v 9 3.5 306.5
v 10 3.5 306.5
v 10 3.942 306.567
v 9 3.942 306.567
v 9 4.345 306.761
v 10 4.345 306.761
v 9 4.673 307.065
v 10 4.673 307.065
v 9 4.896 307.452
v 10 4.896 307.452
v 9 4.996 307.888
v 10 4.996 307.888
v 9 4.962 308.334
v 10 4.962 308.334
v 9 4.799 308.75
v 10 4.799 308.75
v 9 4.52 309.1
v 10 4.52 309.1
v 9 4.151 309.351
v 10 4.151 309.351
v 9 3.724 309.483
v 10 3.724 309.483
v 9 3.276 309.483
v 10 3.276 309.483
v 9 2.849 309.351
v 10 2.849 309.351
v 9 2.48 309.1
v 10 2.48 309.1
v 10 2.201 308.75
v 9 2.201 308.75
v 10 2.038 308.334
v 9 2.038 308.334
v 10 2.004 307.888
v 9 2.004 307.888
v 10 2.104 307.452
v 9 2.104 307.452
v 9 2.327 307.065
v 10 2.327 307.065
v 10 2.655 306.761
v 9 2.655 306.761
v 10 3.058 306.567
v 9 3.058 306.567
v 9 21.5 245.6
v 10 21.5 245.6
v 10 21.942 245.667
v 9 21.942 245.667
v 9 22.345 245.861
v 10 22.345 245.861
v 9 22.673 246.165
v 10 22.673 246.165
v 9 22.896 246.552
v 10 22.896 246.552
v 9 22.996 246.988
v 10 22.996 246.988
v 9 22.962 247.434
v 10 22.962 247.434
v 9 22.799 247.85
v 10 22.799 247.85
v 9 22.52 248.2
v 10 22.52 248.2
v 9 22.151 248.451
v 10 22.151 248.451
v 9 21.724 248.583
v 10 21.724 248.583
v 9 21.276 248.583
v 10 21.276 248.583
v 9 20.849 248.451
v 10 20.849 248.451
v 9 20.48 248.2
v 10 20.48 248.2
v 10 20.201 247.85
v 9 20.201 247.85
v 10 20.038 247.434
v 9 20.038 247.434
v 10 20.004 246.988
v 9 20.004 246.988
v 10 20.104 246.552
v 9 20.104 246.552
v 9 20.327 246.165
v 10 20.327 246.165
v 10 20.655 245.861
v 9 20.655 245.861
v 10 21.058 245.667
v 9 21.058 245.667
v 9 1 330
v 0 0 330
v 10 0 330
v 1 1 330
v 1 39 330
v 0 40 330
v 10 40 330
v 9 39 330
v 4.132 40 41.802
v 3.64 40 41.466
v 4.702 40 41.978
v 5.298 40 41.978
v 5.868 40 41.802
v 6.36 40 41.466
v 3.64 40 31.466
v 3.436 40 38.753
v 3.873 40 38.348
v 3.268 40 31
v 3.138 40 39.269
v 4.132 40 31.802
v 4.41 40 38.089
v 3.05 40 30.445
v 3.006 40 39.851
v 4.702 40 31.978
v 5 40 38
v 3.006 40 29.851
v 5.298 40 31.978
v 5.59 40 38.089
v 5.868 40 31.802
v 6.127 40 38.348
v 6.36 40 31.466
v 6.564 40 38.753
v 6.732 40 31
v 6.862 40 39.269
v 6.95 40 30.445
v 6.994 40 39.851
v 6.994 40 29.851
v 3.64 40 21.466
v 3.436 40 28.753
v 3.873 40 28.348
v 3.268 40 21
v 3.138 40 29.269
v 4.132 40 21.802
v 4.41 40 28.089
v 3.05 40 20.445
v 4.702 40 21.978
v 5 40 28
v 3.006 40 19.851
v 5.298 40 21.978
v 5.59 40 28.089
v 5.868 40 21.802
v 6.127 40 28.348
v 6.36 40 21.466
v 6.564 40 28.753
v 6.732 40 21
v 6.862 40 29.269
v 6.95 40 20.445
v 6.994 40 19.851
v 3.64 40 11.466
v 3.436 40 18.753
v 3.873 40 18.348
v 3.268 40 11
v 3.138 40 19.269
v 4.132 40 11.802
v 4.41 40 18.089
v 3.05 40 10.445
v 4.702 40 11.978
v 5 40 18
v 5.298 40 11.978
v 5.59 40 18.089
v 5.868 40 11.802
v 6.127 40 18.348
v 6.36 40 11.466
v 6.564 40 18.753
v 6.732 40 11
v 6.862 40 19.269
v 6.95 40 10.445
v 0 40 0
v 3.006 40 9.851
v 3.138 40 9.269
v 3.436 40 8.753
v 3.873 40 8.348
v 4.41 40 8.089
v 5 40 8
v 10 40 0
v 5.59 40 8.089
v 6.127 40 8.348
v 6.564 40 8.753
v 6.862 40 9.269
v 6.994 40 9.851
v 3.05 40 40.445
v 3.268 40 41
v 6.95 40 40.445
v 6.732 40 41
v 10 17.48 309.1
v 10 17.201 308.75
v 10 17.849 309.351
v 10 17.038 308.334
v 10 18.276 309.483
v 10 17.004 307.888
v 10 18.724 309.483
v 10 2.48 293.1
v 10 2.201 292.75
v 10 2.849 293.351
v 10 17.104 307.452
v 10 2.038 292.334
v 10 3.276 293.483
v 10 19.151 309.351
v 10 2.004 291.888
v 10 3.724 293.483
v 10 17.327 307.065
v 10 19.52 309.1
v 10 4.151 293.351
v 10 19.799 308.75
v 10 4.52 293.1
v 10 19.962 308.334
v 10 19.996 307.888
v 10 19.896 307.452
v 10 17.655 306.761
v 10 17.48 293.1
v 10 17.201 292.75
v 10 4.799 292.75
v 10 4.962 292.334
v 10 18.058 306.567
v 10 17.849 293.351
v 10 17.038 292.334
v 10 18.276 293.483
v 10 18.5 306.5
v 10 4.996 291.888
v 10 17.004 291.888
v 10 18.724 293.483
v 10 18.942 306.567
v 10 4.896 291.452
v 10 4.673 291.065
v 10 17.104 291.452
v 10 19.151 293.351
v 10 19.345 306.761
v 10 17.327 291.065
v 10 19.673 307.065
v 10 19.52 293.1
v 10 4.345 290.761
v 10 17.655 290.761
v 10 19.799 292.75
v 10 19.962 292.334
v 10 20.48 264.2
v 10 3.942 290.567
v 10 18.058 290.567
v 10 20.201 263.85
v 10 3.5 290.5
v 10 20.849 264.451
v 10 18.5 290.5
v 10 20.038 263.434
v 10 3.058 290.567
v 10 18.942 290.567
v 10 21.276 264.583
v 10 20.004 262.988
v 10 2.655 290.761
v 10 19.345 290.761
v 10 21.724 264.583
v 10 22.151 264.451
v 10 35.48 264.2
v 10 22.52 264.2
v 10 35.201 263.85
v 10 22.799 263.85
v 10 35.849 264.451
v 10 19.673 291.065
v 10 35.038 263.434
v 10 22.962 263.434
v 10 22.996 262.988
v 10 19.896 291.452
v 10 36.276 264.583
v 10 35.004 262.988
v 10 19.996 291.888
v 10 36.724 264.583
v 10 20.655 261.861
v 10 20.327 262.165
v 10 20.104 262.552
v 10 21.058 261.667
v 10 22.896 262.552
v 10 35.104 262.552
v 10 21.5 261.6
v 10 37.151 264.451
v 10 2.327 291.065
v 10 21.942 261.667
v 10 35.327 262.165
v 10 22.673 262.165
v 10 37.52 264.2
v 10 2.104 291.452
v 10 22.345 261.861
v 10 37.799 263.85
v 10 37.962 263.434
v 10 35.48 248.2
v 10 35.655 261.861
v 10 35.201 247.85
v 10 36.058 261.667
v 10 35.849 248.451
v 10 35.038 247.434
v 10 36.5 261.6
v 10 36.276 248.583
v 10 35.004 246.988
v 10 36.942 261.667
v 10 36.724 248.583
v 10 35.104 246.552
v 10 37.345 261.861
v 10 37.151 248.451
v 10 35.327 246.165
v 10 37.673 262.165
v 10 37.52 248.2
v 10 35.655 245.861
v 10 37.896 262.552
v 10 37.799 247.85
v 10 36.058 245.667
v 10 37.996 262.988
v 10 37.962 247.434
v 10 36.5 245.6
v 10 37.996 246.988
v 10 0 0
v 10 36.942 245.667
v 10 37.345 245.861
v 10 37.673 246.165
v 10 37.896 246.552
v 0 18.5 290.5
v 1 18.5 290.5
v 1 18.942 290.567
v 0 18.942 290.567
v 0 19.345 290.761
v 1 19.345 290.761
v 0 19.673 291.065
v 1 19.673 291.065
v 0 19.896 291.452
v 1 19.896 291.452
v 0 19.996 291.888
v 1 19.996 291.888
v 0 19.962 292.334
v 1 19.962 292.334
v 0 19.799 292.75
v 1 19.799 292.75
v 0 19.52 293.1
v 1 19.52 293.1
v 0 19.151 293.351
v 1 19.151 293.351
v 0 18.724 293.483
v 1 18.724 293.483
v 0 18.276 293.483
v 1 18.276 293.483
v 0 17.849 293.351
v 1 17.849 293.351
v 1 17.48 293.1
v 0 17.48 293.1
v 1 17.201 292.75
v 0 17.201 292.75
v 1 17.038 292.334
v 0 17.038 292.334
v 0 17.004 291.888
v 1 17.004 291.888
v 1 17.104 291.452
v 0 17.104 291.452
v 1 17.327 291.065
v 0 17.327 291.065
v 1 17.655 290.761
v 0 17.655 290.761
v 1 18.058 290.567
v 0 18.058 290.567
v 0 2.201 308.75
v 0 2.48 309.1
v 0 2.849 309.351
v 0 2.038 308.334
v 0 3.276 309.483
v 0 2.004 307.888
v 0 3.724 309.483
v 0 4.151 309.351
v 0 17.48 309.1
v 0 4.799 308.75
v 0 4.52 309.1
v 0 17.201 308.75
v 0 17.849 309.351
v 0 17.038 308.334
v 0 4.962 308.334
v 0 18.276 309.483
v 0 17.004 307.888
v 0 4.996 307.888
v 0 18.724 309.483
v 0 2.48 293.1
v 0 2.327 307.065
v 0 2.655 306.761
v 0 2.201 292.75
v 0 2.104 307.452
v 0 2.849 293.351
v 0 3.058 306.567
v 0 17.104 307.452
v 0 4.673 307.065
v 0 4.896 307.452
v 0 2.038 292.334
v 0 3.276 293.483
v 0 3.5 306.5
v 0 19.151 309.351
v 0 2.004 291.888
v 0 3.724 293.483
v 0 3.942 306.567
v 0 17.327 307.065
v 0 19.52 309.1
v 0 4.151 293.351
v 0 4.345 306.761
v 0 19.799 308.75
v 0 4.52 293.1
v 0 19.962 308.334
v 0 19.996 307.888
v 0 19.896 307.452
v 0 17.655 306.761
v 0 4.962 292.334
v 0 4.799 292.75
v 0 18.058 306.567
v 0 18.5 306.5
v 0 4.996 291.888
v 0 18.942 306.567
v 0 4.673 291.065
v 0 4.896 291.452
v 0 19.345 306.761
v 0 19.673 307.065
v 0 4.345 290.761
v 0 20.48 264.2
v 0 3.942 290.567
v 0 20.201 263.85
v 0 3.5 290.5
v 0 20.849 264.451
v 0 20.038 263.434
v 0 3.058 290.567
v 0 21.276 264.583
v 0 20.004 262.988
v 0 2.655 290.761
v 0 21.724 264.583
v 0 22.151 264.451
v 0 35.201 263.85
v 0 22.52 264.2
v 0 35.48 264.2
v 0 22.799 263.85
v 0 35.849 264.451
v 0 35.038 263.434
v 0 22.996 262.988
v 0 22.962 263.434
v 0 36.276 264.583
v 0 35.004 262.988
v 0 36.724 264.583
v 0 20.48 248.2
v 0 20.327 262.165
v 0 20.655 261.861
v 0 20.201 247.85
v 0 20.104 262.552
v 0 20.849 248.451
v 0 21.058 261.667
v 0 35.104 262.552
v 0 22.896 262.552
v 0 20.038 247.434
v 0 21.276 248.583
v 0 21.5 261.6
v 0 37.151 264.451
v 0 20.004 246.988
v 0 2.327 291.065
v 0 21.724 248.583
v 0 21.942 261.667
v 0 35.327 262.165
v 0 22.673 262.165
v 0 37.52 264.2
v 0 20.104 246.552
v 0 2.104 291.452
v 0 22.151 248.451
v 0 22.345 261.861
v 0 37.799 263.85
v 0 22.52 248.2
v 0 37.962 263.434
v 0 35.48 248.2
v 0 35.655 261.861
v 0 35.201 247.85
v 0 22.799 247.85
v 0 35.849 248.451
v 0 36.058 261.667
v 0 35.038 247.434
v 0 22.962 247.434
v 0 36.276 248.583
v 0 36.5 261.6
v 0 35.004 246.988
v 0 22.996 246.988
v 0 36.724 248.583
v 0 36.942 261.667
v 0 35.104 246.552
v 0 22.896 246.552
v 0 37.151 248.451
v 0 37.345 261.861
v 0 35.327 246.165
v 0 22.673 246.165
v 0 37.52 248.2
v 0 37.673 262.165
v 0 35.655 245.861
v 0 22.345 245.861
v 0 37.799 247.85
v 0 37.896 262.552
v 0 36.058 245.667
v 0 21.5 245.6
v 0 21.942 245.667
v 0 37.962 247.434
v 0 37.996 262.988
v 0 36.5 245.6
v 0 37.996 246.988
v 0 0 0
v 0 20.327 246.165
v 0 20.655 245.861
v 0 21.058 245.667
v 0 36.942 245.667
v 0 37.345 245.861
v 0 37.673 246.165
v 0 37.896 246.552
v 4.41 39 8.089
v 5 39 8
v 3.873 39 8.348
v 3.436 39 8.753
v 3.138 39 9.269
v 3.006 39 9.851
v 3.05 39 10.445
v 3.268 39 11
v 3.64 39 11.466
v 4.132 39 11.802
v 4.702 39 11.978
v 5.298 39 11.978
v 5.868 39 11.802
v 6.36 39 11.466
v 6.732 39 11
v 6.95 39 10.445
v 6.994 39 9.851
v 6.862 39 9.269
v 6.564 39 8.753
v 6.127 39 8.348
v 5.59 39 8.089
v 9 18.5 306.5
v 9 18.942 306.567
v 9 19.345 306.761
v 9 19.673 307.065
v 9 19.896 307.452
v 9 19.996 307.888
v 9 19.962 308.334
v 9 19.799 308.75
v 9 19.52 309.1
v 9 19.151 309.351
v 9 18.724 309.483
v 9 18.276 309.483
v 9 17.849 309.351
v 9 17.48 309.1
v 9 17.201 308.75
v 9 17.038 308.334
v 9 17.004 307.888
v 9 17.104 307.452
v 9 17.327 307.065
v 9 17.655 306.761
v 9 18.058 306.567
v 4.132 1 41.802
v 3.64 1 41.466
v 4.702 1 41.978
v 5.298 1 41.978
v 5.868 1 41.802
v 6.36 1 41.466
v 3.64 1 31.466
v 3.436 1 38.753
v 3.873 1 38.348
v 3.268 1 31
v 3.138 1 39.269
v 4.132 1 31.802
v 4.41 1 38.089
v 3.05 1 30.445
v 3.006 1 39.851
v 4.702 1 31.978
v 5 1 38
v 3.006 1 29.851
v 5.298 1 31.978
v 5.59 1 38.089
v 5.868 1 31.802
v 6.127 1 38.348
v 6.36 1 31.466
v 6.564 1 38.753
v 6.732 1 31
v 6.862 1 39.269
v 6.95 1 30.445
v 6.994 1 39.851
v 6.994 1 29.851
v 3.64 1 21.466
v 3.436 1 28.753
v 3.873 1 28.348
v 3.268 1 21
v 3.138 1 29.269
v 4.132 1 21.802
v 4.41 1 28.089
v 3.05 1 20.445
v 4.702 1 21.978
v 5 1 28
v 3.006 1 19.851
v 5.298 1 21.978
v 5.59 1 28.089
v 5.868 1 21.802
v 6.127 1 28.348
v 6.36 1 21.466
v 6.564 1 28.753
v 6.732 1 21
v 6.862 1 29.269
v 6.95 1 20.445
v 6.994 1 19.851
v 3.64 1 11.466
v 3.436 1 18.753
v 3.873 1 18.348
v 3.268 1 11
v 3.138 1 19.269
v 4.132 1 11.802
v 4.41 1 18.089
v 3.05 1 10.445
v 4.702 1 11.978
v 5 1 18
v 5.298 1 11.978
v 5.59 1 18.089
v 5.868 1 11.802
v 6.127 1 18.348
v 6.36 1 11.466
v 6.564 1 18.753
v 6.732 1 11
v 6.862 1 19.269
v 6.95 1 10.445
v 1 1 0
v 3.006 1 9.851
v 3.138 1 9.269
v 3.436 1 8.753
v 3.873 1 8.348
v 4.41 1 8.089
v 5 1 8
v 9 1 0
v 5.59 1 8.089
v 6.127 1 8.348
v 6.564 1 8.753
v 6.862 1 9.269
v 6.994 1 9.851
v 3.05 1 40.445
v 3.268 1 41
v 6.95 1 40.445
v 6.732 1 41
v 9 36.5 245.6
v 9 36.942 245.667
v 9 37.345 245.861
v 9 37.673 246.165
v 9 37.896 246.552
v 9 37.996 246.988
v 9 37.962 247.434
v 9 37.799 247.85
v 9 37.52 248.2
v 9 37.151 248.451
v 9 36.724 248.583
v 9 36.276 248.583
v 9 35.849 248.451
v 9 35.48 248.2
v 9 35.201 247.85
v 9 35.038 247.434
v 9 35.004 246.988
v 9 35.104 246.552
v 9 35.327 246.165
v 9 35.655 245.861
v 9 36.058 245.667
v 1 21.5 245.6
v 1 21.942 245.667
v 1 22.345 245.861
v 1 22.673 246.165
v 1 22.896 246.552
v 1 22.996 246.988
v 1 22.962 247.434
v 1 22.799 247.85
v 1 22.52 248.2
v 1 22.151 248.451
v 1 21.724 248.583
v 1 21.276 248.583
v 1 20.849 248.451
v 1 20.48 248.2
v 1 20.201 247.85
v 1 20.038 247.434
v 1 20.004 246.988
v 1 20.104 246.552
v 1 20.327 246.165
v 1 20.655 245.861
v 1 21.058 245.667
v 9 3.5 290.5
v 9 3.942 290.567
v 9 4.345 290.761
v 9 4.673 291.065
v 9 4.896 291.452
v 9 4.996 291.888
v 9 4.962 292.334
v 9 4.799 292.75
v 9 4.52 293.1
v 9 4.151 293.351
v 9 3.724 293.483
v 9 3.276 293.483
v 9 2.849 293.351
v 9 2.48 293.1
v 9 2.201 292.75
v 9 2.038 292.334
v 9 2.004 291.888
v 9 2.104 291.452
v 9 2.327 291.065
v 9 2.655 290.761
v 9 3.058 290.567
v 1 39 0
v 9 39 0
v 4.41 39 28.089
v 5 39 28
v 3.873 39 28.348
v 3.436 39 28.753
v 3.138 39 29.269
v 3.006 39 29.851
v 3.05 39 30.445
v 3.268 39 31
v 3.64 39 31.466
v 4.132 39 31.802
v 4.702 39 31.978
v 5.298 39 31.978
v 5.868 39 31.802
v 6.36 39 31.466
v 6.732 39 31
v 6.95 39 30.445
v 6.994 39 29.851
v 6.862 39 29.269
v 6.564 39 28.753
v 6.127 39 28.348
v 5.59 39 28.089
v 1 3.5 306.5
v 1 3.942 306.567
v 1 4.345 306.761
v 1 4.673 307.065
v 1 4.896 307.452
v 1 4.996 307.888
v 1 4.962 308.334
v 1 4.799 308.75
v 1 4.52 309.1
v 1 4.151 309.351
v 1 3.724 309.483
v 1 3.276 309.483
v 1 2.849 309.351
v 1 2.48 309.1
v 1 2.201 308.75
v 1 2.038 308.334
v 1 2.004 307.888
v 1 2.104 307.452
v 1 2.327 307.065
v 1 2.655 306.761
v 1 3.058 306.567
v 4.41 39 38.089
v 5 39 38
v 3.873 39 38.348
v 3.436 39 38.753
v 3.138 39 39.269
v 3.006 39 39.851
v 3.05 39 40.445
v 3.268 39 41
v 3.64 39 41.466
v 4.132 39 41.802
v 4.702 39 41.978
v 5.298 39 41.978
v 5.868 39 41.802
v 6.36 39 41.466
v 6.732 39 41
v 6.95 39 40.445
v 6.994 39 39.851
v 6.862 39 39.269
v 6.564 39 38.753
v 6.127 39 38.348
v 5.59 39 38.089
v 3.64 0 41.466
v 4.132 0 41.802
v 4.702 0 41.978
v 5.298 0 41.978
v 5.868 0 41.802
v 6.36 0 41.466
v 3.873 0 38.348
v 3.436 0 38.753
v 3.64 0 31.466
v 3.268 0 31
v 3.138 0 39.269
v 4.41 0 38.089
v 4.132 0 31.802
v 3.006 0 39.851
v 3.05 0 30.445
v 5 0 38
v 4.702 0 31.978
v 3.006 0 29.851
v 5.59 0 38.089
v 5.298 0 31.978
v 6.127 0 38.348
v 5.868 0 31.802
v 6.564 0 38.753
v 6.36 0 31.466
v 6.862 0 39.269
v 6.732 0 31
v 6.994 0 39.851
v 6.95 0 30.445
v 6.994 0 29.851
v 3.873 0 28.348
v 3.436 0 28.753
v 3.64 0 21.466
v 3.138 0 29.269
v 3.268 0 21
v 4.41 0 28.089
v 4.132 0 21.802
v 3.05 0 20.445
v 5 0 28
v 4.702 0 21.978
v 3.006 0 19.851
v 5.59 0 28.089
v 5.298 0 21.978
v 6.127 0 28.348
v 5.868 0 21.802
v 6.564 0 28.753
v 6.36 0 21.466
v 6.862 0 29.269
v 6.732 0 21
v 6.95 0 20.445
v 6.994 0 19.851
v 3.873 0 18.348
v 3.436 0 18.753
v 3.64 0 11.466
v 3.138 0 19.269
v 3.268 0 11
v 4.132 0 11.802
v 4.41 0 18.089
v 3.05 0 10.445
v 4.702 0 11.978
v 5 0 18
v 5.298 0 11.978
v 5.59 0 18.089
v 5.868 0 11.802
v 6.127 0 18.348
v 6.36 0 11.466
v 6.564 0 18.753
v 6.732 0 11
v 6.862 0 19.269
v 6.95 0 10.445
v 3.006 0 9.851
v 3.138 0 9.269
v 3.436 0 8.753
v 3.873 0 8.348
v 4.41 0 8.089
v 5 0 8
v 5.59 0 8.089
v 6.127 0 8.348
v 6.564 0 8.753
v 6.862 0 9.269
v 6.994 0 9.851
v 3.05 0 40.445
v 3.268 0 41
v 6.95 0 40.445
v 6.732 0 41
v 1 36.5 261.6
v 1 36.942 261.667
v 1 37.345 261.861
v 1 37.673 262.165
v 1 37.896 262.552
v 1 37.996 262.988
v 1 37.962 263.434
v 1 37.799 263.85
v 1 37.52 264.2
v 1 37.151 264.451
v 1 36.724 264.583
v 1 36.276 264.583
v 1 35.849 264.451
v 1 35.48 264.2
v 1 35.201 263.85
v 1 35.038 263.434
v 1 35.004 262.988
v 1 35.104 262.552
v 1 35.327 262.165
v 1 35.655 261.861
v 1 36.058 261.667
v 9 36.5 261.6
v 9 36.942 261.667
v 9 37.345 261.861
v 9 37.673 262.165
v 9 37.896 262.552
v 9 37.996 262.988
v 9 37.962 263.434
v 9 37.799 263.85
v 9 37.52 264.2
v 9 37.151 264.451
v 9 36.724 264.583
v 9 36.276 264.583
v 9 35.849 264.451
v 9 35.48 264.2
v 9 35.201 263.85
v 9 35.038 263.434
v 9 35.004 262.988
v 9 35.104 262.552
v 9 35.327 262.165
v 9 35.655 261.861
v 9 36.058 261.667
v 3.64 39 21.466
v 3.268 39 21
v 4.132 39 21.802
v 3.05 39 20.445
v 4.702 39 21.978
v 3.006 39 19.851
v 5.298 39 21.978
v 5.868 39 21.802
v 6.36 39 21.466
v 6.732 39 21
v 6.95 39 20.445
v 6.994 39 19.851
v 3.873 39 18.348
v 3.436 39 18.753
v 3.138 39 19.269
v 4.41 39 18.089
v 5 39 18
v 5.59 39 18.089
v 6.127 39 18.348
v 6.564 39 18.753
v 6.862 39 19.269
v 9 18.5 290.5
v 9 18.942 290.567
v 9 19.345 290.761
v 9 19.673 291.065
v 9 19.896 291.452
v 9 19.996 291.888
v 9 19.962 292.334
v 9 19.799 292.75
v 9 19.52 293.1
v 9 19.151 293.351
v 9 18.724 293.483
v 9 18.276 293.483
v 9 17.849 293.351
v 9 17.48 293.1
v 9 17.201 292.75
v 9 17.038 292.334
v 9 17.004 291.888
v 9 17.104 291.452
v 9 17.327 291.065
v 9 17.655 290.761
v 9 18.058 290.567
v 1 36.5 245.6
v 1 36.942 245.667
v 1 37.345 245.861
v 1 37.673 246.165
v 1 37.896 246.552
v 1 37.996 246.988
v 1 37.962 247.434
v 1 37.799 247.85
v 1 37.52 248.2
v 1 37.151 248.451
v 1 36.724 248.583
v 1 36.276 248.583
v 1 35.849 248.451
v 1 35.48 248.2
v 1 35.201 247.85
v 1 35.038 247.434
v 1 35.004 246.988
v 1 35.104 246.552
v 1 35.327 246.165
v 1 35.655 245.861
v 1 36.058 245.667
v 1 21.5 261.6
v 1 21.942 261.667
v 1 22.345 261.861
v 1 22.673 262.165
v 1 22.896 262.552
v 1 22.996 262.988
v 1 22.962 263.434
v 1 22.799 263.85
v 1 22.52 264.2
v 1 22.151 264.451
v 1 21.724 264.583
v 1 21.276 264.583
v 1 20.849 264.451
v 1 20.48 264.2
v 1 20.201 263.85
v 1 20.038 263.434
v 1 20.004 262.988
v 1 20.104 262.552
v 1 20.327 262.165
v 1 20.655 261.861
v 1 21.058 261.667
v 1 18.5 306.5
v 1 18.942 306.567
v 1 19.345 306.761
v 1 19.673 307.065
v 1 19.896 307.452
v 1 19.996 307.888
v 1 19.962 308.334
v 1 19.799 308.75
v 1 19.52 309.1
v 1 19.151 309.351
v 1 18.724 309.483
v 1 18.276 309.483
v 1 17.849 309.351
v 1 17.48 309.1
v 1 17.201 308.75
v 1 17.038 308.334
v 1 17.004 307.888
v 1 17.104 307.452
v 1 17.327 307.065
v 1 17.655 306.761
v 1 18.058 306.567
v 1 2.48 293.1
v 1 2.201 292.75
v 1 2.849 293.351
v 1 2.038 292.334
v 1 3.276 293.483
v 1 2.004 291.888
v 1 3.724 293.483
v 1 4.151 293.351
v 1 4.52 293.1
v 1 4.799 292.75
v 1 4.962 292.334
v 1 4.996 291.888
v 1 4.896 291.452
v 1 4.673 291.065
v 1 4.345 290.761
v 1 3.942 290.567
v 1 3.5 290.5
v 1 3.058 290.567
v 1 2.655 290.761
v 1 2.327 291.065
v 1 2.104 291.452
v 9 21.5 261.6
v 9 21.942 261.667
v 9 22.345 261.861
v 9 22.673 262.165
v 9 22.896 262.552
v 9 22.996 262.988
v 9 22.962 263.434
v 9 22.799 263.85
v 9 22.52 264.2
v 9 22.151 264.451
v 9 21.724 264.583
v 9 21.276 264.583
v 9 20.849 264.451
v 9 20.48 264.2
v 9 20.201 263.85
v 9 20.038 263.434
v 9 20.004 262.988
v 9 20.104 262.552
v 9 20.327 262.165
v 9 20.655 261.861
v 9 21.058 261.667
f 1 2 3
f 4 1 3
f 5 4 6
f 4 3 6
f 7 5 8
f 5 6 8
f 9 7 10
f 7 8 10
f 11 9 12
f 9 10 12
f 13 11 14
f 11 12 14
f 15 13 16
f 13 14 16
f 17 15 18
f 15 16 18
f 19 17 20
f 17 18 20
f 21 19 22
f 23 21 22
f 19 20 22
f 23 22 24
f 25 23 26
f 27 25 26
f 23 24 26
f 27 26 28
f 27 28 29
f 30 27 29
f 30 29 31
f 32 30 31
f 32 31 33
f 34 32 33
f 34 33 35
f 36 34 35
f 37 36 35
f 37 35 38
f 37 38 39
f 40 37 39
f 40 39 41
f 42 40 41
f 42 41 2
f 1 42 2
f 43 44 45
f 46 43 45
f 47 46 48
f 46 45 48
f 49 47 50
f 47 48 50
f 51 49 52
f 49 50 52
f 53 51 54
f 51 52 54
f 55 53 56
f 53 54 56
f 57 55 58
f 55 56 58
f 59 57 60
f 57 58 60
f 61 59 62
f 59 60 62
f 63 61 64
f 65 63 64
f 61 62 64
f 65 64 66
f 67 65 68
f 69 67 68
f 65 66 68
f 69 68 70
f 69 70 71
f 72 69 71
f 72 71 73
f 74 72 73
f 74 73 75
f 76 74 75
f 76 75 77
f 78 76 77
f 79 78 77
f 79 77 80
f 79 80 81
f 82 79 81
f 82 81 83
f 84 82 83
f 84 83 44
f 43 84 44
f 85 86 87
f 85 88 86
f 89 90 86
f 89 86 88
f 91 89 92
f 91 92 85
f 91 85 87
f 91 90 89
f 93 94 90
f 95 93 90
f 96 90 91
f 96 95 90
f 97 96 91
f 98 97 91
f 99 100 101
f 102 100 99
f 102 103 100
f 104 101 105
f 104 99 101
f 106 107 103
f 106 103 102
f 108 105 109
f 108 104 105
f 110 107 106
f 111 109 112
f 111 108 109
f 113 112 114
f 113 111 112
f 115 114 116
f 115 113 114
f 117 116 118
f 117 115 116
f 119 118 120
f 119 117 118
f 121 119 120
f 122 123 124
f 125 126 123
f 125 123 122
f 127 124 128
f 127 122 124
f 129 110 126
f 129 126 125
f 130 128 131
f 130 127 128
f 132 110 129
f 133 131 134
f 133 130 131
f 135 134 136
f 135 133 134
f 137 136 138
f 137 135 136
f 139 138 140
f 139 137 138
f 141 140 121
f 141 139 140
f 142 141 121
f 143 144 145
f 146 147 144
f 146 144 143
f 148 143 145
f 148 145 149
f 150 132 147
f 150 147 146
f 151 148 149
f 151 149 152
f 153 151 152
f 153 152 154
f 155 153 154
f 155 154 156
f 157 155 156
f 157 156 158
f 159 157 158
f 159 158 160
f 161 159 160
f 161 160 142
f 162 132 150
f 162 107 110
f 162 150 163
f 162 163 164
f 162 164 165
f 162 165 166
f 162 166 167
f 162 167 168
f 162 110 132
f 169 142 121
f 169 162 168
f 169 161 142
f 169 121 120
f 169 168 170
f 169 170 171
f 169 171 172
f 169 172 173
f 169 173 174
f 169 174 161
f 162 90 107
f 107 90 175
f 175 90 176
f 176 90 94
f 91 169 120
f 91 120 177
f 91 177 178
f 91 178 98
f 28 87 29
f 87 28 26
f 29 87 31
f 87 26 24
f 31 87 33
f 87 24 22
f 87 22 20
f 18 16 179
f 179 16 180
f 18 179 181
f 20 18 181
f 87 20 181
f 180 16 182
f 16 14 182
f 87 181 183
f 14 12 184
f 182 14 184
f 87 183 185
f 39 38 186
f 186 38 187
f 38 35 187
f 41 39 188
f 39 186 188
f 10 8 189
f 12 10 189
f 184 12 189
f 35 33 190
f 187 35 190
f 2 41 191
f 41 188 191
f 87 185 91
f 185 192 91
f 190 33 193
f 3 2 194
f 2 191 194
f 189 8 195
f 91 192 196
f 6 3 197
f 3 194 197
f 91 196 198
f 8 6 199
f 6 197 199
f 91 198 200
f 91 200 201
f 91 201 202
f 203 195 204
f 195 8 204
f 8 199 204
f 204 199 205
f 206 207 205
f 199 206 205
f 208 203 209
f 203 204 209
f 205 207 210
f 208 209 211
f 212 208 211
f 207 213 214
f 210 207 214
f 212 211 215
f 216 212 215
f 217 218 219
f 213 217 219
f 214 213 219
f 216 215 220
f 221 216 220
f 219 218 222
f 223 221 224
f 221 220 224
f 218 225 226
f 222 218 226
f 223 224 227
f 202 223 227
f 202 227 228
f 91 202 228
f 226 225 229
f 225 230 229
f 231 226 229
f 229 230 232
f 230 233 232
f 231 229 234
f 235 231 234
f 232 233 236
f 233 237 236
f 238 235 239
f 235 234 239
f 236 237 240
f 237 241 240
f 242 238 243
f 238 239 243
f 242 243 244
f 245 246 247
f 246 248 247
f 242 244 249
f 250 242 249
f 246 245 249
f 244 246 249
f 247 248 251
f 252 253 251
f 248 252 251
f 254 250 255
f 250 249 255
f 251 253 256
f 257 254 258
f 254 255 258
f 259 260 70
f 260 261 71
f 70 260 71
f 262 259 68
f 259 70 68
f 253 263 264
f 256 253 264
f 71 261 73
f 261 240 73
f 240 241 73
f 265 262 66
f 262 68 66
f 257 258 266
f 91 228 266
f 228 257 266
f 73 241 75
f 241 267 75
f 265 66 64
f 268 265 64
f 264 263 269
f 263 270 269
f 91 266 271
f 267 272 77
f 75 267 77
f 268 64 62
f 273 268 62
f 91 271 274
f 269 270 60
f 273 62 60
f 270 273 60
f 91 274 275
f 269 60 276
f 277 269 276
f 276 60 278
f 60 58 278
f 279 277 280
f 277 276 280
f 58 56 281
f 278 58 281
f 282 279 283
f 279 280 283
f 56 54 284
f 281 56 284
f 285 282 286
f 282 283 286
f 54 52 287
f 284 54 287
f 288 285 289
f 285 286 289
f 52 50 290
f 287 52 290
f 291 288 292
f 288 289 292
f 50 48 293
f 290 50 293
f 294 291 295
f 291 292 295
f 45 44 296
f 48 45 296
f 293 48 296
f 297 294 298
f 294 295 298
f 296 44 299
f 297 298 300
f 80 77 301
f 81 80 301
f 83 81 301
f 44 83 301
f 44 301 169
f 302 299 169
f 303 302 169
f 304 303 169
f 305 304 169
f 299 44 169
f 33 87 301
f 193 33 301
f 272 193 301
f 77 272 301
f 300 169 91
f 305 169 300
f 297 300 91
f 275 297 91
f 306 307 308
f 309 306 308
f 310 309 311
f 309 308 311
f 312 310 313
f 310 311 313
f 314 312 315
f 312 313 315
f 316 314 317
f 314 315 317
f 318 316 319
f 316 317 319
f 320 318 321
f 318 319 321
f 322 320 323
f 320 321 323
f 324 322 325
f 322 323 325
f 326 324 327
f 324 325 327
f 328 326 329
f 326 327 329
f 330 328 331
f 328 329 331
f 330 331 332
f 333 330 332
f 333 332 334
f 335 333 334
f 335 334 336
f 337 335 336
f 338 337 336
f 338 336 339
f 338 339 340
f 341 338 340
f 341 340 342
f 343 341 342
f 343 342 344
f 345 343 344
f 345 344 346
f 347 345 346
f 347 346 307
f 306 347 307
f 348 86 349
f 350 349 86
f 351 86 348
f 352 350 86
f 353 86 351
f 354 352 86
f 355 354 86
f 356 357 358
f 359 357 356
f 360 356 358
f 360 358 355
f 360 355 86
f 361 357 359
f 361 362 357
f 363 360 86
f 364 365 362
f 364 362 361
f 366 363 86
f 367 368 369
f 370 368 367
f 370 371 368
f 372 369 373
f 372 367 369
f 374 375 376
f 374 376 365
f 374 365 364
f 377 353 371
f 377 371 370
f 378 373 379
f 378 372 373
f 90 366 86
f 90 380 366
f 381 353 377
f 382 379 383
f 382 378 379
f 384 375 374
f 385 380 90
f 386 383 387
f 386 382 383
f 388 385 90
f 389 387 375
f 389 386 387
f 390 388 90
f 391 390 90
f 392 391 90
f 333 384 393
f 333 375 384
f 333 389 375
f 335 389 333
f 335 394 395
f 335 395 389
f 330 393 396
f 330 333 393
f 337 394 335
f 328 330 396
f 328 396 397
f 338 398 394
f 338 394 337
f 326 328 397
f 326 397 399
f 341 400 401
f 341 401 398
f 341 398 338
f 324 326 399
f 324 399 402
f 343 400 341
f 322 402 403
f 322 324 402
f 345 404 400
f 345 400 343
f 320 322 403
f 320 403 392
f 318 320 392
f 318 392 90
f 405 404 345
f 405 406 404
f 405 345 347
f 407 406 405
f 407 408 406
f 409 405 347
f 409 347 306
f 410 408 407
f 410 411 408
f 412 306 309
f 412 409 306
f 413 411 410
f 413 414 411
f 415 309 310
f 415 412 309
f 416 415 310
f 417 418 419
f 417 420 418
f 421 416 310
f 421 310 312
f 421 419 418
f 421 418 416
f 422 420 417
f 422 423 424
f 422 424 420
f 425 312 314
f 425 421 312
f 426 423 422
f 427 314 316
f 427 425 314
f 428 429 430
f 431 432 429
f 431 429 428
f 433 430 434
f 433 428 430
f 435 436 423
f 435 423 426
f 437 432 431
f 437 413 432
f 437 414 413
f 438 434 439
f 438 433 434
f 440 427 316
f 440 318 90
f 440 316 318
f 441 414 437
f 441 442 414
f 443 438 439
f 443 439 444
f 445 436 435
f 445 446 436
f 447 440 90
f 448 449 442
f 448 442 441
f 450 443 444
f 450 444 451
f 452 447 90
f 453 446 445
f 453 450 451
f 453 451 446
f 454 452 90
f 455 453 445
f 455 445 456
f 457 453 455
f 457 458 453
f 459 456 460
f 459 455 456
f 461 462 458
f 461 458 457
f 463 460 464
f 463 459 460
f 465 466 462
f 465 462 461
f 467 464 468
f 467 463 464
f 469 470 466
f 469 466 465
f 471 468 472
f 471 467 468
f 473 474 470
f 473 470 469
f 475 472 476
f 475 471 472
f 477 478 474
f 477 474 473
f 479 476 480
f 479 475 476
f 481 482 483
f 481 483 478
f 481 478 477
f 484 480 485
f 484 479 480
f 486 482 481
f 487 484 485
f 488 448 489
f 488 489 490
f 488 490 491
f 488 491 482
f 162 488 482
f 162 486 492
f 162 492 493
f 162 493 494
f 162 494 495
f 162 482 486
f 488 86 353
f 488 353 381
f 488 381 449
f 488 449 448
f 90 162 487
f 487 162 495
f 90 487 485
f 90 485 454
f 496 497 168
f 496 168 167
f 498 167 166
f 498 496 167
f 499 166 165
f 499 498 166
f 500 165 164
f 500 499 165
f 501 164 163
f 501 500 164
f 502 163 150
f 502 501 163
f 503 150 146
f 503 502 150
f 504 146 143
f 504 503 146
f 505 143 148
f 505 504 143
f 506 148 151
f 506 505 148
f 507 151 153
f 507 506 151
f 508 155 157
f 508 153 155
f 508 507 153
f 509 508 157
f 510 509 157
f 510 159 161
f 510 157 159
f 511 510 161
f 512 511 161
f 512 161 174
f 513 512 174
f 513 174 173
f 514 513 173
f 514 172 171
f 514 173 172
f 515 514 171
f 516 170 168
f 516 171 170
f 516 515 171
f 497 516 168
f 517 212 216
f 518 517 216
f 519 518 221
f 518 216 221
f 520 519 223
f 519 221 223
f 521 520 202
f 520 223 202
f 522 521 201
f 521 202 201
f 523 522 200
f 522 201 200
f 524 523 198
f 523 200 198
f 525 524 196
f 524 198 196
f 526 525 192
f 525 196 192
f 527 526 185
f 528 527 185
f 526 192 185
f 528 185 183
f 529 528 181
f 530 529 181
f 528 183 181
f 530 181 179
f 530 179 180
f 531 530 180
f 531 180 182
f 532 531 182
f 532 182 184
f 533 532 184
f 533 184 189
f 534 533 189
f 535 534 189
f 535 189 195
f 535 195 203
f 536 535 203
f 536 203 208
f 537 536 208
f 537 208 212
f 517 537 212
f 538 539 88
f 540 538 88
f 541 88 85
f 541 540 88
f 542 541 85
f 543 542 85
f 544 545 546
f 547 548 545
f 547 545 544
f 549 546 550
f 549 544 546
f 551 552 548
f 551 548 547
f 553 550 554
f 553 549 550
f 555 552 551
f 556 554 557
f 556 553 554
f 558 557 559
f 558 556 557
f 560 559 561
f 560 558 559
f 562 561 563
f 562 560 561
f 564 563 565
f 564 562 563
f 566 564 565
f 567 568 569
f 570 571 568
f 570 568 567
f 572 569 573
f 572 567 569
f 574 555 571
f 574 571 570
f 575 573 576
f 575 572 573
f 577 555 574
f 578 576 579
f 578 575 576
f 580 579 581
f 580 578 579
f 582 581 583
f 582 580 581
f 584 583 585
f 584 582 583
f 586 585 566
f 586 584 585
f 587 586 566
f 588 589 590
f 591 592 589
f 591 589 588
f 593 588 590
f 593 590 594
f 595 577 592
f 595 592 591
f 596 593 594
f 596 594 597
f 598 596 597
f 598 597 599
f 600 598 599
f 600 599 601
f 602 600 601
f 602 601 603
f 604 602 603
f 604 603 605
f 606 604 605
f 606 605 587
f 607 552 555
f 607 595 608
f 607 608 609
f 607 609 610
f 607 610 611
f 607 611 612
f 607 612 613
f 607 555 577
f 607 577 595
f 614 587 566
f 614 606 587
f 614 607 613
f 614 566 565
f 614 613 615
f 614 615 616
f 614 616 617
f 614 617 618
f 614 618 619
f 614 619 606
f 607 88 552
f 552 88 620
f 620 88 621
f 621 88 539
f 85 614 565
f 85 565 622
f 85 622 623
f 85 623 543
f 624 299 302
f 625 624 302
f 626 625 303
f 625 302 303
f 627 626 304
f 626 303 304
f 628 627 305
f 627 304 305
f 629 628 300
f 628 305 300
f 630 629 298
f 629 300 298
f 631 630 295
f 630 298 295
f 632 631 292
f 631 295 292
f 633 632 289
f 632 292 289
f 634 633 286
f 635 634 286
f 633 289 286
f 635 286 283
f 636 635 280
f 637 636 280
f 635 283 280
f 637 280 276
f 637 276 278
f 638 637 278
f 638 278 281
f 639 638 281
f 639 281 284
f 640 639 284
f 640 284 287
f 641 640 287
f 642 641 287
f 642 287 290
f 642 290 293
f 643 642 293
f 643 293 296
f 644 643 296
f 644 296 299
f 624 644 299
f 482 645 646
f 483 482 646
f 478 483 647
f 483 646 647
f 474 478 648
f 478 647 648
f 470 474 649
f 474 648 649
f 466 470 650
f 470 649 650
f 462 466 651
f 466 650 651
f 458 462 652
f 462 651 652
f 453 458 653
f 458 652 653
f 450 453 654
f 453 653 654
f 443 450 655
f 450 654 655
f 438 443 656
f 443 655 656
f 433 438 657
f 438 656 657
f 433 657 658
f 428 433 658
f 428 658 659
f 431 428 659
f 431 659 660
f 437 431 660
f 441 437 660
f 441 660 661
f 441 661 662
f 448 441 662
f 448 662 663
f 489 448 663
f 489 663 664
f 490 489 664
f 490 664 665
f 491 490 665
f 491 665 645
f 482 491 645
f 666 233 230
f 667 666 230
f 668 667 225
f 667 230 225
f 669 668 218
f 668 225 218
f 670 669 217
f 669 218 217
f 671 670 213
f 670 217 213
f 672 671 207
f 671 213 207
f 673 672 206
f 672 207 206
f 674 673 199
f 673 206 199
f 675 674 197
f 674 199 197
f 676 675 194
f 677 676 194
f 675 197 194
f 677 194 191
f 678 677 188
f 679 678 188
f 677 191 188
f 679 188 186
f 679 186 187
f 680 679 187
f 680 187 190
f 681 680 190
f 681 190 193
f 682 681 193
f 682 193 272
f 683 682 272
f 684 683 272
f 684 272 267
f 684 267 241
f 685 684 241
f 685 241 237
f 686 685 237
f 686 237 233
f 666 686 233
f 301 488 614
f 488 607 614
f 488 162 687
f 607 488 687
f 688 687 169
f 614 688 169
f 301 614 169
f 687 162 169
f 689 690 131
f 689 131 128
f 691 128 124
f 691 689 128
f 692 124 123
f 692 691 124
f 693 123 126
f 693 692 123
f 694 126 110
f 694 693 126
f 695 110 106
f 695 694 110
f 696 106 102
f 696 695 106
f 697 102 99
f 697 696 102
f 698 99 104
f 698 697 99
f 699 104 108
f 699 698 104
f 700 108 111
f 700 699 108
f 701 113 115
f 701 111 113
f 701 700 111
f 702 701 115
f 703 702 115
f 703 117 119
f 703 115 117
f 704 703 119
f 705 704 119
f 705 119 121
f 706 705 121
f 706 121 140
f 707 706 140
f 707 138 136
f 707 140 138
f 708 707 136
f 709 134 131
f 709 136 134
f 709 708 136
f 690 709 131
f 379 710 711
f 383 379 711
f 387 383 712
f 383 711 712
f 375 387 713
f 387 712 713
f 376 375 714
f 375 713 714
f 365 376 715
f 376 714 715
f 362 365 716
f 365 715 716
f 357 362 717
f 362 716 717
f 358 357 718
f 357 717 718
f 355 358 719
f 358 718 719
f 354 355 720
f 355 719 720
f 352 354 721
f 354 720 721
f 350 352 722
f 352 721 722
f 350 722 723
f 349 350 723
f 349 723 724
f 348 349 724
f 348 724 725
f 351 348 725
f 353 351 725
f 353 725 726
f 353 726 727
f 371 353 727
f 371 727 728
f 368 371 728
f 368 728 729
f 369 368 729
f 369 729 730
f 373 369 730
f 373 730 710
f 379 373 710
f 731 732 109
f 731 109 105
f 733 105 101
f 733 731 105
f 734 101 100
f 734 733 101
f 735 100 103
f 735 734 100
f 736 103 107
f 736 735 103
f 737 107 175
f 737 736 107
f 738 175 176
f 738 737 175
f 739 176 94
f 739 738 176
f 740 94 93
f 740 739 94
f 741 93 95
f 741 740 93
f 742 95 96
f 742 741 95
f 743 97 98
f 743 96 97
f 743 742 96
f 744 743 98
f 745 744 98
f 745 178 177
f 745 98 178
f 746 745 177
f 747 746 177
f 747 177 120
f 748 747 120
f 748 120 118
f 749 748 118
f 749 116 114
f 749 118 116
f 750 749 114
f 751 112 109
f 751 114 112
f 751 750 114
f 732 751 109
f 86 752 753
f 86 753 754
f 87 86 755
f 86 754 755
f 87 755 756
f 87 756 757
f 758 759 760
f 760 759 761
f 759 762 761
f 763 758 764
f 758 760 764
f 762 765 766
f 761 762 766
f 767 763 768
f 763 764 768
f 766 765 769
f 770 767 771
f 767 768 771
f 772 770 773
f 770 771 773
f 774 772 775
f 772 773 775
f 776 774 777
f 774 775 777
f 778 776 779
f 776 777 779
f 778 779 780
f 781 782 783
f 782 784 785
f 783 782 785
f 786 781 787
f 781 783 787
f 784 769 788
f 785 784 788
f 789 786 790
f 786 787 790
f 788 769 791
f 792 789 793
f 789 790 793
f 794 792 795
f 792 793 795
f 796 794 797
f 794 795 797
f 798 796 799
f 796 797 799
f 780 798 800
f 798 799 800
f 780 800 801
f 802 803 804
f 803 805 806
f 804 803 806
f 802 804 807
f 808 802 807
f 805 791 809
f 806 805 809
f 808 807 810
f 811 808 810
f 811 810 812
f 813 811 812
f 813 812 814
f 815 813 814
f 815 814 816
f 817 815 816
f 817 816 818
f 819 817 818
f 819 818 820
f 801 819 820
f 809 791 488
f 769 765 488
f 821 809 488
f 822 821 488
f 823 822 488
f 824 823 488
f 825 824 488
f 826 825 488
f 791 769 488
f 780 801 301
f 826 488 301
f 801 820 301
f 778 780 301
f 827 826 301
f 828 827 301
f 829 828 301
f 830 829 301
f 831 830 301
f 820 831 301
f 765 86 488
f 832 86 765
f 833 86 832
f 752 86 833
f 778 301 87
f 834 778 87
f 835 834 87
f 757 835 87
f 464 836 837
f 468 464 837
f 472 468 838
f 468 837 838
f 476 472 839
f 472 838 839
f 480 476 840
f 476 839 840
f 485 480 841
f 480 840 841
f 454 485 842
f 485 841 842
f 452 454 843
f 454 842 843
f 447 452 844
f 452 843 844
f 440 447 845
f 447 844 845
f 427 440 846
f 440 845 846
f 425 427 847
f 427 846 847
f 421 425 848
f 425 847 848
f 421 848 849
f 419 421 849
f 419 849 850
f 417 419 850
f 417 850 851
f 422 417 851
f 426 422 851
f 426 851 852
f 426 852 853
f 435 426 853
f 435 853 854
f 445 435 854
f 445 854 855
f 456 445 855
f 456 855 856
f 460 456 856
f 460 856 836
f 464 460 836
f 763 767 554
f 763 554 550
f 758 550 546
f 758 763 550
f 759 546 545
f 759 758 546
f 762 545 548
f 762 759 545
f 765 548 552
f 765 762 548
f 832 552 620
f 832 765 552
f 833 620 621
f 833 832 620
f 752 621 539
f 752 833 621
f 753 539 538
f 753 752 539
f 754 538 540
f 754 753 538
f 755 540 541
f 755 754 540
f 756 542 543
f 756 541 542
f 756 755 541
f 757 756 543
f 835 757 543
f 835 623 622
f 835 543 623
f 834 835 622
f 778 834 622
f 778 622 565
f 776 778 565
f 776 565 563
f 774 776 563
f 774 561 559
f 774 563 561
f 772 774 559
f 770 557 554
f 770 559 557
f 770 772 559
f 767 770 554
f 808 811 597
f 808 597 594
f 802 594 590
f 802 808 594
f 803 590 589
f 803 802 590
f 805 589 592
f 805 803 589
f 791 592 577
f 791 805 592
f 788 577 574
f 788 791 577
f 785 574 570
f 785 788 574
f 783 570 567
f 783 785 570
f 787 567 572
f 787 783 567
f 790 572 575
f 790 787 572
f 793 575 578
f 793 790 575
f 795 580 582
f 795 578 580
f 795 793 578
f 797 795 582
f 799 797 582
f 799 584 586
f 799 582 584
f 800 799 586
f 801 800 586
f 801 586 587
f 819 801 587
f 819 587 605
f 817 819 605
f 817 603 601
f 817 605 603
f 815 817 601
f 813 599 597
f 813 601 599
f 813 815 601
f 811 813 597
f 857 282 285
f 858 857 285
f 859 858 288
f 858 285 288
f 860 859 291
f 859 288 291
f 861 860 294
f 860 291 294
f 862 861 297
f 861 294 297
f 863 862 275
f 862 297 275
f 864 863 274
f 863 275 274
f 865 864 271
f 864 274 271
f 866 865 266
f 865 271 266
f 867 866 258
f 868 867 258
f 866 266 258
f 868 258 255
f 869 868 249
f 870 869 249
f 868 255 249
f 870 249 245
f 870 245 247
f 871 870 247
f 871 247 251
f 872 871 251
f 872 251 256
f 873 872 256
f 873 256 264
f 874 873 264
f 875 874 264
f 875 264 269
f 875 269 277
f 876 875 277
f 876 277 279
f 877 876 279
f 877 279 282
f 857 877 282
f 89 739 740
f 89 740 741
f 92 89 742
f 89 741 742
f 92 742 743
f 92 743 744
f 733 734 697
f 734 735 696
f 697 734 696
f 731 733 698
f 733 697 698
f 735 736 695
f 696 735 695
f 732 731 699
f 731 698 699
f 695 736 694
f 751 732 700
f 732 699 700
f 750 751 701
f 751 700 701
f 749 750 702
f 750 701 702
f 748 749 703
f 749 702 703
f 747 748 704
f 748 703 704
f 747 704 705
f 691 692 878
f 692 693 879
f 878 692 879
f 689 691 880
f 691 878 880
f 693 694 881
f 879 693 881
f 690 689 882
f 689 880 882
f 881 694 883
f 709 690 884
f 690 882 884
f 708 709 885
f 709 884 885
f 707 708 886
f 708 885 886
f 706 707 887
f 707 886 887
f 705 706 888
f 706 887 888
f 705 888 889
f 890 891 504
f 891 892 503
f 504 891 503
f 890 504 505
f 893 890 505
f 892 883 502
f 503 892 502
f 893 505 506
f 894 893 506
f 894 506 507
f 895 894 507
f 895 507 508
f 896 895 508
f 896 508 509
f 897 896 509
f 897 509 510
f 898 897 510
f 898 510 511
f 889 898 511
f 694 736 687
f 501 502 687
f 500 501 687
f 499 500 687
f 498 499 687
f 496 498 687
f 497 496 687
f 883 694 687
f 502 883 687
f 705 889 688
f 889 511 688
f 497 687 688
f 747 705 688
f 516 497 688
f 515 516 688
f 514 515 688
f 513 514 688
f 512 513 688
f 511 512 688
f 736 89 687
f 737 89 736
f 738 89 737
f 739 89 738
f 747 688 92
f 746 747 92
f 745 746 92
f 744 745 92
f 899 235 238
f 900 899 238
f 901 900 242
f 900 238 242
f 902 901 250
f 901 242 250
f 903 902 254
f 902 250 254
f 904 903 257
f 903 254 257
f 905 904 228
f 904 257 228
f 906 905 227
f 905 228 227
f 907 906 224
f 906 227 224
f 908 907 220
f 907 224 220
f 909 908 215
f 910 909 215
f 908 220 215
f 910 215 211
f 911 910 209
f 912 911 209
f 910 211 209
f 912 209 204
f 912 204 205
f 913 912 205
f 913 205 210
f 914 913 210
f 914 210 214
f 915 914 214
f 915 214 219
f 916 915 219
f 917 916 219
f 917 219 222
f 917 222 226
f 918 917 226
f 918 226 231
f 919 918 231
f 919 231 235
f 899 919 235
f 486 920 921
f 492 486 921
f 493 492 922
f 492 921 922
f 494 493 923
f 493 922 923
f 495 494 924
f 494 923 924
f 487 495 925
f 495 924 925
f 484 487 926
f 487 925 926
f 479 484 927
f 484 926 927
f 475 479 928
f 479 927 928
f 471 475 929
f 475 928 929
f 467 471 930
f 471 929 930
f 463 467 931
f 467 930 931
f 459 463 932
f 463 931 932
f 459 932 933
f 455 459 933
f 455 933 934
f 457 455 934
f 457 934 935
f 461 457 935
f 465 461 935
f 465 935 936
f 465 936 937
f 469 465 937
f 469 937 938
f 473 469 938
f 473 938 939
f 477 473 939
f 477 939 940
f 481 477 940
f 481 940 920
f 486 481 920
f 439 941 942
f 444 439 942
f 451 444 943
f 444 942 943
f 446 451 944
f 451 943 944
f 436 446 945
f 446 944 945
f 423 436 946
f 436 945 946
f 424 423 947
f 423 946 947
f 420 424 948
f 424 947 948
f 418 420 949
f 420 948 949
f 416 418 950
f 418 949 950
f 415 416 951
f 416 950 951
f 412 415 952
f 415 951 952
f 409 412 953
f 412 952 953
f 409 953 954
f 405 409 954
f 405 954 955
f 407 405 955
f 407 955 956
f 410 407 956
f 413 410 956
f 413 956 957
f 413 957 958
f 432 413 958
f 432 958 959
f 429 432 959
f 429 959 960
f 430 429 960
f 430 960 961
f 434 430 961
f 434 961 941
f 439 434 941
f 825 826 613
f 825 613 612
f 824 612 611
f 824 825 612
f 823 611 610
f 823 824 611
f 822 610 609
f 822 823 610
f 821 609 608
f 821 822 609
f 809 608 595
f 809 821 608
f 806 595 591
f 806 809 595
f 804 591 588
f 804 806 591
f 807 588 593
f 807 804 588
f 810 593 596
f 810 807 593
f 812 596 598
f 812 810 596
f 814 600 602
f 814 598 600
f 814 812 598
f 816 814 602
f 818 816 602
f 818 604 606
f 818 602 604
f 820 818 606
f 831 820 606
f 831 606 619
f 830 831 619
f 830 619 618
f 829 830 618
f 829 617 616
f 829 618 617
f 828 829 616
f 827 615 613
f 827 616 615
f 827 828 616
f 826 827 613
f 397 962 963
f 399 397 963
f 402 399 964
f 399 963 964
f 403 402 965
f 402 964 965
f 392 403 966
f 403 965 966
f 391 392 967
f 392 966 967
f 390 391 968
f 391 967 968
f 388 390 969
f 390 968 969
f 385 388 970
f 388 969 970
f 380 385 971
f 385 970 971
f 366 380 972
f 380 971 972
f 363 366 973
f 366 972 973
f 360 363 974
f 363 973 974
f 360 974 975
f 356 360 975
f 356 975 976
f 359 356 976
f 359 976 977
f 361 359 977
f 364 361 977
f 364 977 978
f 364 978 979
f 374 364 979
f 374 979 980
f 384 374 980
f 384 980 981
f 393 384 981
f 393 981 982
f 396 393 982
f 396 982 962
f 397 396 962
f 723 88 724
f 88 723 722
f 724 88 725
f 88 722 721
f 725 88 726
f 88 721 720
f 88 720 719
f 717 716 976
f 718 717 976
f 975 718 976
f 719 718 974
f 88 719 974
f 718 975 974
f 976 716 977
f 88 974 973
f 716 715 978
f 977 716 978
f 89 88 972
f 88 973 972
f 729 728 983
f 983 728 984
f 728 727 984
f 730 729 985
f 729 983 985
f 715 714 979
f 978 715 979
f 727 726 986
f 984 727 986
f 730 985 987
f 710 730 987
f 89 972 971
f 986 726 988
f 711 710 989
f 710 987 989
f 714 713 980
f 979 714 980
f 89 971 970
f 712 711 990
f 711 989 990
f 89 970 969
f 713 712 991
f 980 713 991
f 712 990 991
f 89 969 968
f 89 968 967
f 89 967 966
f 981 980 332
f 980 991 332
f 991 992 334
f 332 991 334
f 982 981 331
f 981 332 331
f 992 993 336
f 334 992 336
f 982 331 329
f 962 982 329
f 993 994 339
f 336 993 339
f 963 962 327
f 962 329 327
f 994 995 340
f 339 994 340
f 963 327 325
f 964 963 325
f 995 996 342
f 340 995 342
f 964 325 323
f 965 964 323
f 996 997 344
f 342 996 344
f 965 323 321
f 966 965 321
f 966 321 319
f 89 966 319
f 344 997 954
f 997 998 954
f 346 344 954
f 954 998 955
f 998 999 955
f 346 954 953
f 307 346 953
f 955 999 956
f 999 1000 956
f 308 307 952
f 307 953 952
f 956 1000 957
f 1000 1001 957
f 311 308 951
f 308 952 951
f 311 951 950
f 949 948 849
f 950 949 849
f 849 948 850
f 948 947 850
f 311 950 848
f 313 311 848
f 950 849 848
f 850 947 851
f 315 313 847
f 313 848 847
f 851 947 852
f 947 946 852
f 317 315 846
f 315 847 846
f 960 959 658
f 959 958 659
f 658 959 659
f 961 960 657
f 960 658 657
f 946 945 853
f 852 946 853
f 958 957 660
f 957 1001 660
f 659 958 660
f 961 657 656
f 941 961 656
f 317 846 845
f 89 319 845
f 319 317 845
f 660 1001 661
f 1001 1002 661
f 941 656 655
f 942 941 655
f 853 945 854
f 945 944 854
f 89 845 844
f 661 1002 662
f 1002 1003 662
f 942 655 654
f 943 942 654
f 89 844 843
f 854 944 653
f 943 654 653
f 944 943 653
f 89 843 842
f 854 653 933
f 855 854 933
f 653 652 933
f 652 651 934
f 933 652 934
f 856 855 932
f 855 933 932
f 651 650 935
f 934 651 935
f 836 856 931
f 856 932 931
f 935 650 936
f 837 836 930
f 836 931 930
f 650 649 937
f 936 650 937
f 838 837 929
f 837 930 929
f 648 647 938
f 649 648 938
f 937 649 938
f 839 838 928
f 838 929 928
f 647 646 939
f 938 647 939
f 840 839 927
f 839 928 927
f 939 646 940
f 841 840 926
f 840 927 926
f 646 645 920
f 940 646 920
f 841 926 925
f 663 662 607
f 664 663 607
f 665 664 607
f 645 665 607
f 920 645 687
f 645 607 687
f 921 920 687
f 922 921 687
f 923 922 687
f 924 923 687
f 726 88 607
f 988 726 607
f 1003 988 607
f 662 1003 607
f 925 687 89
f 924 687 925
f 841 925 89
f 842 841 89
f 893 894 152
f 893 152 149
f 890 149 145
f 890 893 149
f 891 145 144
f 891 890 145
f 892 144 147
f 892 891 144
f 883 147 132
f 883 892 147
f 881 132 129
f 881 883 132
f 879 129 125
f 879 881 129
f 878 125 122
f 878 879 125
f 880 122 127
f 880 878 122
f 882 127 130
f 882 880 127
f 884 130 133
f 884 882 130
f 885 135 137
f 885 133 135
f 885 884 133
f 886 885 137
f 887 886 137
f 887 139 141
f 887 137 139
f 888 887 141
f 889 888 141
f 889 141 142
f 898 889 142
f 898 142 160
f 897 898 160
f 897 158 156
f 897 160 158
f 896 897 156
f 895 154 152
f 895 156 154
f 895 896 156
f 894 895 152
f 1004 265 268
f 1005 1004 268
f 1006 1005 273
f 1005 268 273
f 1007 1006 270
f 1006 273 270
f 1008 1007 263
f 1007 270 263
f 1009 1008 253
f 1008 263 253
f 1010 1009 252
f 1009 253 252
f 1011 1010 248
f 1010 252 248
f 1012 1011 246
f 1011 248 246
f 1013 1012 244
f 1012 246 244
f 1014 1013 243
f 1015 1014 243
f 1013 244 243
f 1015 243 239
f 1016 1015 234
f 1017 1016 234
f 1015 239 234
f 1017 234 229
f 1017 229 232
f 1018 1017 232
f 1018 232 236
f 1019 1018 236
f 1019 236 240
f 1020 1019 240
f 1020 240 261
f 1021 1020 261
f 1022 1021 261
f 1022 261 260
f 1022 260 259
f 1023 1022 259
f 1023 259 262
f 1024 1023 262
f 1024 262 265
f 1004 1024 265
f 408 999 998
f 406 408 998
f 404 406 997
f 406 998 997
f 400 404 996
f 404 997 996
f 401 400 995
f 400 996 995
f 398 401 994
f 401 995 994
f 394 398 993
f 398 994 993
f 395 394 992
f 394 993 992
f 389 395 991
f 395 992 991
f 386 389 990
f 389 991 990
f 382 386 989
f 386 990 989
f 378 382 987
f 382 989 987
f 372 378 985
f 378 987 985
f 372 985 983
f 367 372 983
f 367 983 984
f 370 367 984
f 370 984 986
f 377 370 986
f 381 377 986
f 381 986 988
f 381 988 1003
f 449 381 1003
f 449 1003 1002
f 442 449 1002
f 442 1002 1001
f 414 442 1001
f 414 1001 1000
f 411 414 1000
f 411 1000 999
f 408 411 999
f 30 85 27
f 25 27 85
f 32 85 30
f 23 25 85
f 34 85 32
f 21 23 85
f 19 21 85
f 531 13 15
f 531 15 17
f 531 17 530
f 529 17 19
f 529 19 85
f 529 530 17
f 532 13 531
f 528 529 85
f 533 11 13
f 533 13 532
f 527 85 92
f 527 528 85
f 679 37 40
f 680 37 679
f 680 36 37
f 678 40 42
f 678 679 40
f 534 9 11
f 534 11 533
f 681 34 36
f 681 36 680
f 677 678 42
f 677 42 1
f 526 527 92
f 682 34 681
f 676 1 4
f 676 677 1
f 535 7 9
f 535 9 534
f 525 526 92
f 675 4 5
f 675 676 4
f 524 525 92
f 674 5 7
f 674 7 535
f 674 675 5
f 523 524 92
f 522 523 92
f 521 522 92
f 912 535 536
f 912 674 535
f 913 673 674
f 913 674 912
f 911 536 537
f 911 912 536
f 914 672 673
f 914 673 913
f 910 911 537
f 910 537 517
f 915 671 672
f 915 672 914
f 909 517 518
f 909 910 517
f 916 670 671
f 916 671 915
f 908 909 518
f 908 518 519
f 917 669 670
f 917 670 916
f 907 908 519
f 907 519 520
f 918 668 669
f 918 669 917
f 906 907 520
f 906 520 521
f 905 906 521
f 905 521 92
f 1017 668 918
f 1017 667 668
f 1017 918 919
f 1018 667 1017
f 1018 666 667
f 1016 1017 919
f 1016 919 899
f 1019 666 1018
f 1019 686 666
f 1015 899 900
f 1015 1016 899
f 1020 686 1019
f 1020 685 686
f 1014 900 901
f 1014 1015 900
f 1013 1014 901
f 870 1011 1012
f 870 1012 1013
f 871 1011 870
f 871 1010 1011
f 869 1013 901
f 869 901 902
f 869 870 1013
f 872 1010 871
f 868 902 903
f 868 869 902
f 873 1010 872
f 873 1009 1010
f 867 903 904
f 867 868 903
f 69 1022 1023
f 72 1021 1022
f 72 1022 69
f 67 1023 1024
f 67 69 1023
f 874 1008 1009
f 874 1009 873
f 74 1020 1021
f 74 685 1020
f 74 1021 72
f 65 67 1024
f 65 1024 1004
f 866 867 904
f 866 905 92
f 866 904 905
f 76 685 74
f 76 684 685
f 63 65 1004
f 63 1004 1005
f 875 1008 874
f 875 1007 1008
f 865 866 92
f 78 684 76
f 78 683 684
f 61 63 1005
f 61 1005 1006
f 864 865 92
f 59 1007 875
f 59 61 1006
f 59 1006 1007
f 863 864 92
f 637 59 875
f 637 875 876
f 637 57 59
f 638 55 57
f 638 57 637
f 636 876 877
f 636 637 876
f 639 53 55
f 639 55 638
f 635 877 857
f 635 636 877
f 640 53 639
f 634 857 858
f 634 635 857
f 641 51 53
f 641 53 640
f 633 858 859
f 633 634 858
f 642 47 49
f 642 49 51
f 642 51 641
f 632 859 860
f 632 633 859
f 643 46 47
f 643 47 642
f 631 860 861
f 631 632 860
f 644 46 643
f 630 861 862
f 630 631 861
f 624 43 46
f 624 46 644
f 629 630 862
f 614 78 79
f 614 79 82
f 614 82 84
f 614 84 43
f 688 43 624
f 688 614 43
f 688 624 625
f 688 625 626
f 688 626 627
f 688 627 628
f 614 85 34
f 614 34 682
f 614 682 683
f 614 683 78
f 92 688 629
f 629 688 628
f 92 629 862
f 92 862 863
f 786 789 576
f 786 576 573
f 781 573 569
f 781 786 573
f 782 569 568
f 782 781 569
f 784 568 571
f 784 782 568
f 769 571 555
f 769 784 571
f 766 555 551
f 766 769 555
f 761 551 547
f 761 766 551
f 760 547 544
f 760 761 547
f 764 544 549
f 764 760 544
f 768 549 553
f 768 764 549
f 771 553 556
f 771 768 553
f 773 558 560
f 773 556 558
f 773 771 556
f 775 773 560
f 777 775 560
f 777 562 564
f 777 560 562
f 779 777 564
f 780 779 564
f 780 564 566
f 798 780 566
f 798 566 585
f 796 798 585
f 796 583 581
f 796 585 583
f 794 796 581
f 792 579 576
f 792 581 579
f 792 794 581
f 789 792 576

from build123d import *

# Parameters (mm, degrees)
SKETCH_1_W               = 10
SKETCH_1_H               = 40
SKETCH_1_W_2             = 8
SKETCH_1_H_2             = 38
EXTRUDE_1_DEPTH          = 330
SKETCH_3_R               = 1.5
CUT_EXTRUDE_2_DEPTH      = 10
CUT_EXTRUDE_4_DEPTH      = 333.565782966
CUT_EXTRUDE_4_DEPTH_BACK = 333.565782966
SKETCH_4_R               = 2


with BuildPart() as part:
    # 草图1 → 凸台-拉伸1 (new body)
    with BuildSketch(Plane.XY):
        with Locations((5, 20)):
            Rectangle(SKETCH_1_W, SKETCH_1_H)
        with Locations((5, 20)):
            Rectangle(SKETCH_1_W_2, SKETCH_1_H_2, mode=Mode.SUBTRACT)
    extrude(amount=EXTRUDE_1_DEPTH)

    # 草图3 → 切除-拉伸2 (cut)
    with BuildSketch(Plane(origin=(10, 0, 0), x_dir=(0, 0, -1), z_dir=(1, 0, 0))):
        with Locations((-308, 18.5)):
            Circle(SKETCH_3_R)
        with Locations((-292, 18.5)):
            Circle(SKETCH_3_R)
        with Locations((-292, 3.5)):
            Circle(SKETCH_3_R)
        with Locations((-308, 3.5)):
            Circle(SKETCH_3_R)
        with Locations((-263.1, 36.5)):
            Circle(SKETCH_3_R)
        with Locations((-247.1, 36.5)):
            Circle(SKETCH_3_R)
        with Locations((-263.1, 21.5)):
            Circle(SKETCH_3_R)
        with Locations((-247.1, 21.5)):
            Circle(SKETCH_3_R)
    extrude(amount=-CUT_EXTRUDE_2_DEPTH, mode=Mode.SUBTRACT)

    # 草图4 → 切除-拉伸4 (cut, two sides: drawn at the far end of the back side and taken through both)
    with BuildSketch(Plane(origin=(0, 40, 0), x_dir=(1, 0, 0), z_dir=(0, 1, 0)).offset(-CUT_EXTRUDE_4_DEPTH_BACK)):
        with Locations(Location((5, -10, 0), (0, 0, 90))):
            Circle(SKETCH_4_R)
        with Locations(Location((5, -20, 0), (0, 0, 90))):
            Circle(SKETCH_4_R)
        with Locations(Location((5, -30, 0), (0, 0, 90))):
            Circle(SKETCH_4_R)
        with Locations(Location((5, -40, 0), (0, 0, 90))):
            Circle(SKETCH_4_R)
    extrude(amount=CUT_EXTRUDE_4_DEPTH + CUT_EXTRUDE_4_DEPTH_BACK, mode=Mode.SUBTRACT)


solid = part.part
